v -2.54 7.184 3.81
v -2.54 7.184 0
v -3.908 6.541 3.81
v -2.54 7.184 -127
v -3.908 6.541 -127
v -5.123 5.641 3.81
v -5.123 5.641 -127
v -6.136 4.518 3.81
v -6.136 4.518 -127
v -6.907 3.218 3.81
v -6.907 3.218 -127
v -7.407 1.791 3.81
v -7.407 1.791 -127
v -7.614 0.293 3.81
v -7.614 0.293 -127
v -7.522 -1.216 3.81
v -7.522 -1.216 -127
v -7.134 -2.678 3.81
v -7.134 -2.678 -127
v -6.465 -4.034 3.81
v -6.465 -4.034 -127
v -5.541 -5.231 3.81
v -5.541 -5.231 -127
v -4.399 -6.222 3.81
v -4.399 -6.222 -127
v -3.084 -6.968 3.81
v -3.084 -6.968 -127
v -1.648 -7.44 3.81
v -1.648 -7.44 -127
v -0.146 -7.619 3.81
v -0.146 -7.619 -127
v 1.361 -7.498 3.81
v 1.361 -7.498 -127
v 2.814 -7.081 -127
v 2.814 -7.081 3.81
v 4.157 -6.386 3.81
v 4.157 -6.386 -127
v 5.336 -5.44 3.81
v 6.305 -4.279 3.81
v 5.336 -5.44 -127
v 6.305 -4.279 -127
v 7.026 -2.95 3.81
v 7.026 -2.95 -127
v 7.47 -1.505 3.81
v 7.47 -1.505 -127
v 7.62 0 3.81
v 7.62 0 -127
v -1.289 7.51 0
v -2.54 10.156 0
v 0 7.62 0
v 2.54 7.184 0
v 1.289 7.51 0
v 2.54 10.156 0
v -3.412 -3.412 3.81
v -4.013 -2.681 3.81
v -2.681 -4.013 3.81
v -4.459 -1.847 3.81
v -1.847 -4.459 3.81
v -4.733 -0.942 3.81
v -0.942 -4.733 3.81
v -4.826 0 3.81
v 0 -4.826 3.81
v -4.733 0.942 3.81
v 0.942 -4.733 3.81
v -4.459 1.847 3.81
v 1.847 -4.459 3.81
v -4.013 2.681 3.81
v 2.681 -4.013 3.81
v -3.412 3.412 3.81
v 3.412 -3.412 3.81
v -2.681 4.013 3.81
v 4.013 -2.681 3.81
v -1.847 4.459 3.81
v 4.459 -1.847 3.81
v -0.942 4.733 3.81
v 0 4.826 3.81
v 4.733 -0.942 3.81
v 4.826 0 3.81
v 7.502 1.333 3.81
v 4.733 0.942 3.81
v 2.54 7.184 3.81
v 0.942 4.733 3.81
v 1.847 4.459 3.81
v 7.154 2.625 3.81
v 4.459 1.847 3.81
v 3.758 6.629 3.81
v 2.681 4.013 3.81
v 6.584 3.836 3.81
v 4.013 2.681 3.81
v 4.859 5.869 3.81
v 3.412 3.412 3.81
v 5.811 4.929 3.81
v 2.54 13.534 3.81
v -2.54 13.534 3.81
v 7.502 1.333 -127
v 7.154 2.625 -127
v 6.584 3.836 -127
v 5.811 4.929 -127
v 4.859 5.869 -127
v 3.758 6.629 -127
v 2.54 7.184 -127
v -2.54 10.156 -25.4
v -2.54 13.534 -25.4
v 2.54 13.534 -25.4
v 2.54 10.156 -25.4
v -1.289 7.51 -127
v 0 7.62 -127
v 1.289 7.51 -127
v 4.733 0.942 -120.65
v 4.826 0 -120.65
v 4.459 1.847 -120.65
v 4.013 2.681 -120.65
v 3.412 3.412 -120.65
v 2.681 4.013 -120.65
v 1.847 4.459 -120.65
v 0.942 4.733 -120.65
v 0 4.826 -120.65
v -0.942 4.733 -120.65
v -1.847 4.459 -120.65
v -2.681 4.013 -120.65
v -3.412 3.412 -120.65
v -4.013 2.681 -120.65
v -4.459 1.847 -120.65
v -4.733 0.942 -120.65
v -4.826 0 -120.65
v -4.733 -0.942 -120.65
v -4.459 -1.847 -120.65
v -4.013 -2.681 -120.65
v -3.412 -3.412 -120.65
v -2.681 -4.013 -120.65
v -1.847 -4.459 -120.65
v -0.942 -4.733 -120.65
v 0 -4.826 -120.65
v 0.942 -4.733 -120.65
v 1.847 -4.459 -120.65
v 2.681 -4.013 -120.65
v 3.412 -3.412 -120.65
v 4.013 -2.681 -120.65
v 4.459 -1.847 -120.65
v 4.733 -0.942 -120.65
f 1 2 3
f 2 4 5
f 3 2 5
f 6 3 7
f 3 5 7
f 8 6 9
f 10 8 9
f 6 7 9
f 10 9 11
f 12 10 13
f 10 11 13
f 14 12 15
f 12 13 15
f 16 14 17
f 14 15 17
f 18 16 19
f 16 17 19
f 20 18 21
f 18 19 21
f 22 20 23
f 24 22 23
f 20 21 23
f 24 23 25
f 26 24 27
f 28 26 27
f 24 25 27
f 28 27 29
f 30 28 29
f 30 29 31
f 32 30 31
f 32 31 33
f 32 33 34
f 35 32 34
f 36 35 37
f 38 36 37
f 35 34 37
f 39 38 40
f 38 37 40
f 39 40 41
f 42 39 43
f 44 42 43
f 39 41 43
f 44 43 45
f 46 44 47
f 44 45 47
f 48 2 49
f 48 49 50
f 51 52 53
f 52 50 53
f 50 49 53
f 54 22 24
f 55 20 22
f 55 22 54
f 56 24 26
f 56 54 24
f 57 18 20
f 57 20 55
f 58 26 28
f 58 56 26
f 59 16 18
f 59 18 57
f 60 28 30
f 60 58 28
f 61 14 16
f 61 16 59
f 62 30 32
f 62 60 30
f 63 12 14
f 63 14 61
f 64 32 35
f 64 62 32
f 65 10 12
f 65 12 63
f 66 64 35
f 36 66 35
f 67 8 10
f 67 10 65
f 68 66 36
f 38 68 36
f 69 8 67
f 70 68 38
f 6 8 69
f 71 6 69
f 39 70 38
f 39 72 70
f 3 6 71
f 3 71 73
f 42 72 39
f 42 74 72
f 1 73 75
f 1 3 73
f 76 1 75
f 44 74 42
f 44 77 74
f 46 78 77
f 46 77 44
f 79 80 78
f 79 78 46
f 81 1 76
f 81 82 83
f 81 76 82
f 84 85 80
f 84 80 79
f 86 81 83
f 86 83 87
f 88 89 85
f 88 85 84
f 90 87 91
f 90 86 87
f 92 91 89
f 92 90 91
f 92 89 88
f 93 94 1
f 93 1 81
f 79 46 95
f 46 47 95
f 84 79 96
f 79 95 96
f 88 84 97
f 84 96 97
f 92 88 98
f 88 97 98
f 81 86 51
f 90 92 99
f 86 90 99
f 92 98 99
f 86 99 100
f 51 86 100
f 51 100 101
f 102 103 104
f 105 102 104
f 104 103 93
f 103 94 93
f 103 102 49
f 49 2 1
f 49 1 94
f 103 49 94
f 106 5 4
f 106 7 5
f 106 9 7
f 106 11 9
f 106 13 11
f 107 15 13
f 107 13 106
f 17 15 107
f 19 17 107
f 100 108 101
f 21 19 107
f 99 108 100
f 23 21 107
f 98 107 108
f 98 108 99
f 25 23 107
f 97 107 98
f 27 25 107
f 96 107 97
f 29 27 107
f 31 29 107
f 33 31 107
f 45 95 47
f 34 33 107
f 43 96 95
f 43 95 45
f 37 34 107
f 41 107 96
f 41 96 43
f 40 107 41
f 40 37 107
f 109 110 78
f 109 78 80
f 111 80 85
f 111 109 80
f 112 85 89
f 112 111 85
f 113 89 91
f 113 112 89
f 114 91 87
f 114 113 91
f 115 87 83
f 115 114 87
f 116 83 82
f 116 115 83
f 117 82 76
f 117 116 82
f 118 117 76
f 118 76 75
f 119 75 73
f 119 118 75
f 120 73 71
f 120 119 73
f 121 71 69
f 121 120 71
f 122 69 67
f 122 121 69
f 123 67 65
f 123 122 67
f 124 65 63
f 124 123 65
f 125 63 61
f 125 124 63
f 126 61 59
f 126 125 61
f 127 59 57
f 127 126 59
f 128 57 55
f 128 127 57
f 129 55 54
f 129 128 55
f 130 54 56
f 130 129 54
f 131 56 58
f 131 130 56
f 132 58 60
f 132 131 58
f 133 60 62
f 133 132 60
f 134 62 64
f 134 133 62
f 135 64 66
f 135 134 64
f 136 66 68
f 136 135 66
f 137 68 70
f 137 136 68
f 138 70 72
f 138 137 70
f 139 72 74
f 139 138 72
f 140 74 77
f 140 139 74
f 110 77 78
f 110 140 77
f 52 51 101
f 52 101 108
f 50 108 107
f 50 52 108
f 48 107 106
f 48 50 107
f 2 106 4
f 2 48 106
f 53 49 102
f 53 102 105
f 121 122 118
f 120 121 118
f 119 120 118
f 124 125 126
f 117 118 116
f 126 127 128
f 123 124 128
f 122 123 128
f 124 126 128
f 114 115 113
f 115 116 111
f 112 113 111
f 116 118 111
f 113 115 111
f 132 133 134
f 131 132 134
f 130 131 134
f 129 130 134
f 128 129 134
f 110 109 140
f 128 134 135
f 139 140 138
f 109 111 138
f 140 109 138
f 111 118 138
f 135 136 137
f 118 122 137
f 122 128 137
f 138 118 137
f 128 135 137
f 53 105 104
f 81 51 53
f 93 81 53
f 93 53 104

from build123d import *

# Parameters (mm, degrees)
F0_R     = 4.826
F1_DEPTH = 127
F0_W     = 5.08
F0_H     = 3.3782
F2_DEPTH = 3.81
F3_DEPTH = 25.4
F4_R     = 4.826
F5_DEPTH = 6.35


with BuildPart() as f1:
    # F0 (on Top) → F1 (new body)
    with BuildSketch(Plane.XY):
        with BuildLine():
            ThreePointArc((-2.54, 7.184205), (-4.399409, -6.221704), (7.62, 0))
            ThreePointArc((7.62, 0), (6.221704, 4.399409), (2.54, 7.184205))
            ThreePointArc((2.54, 7.184205), (0, 7.62), (-2.54, 7.184205))
        make_face()
        Circle(F0_R, mode=Mode.SUBTRACT)
    extrude(amount=-F1_DEPTH)

    # F0 (on Top) → F2 (join)
    with BuildSketch(Plane.XY):
        with BuildLine():
            ThreePointArc((-2.54, 7.184205), (-4.399409, -6.221704), (7.62, 0))
            ThreePointArc((7.62, 0), (6.221704, 4.399409), (2.54, 7.184205))
            ThreePointArc((2.54, 7.184205), (0, 7.62), (-2.54, 7.184205))
        make_face()
        Circle(F0_R, mode=Mode.SUBTRACT)
        with BuildLine():
            ThreePointArc((-2.54, 7.184205), (0, 7.62), (2.54, 7.184205))
            Line((2.54, 7.184205), (2.54, 10.156005))
            Line((2.54, 10.156005), (-2.54, 10.156005))
            Line((-2.54, 10.156005), (-2.54, 7.184205))
        make_face()
        with Locations((0, 11.845105)):
            Rectangle(F0_W, F0_H)
    extrude(amount=F2_DEPTH)

    # F0 (on Top) → F3 (join)
    with BuildSketch(Plane.XY):
        with Locations((0, 11.845105)):
            Rectangle(F0_W, F0_H)
    extrude(amount=-F3_DEPTH)

    # F4 (on face) → F5 (join)
    with BuildSketch(Plane(origin=(0, 0, -127), x_dir=(1, 0, 0), z_dir=(0, 0, -1))):
        Circle(F4_R)
    extrude(amount=-F5_DEPTH)


solid = f1.part
